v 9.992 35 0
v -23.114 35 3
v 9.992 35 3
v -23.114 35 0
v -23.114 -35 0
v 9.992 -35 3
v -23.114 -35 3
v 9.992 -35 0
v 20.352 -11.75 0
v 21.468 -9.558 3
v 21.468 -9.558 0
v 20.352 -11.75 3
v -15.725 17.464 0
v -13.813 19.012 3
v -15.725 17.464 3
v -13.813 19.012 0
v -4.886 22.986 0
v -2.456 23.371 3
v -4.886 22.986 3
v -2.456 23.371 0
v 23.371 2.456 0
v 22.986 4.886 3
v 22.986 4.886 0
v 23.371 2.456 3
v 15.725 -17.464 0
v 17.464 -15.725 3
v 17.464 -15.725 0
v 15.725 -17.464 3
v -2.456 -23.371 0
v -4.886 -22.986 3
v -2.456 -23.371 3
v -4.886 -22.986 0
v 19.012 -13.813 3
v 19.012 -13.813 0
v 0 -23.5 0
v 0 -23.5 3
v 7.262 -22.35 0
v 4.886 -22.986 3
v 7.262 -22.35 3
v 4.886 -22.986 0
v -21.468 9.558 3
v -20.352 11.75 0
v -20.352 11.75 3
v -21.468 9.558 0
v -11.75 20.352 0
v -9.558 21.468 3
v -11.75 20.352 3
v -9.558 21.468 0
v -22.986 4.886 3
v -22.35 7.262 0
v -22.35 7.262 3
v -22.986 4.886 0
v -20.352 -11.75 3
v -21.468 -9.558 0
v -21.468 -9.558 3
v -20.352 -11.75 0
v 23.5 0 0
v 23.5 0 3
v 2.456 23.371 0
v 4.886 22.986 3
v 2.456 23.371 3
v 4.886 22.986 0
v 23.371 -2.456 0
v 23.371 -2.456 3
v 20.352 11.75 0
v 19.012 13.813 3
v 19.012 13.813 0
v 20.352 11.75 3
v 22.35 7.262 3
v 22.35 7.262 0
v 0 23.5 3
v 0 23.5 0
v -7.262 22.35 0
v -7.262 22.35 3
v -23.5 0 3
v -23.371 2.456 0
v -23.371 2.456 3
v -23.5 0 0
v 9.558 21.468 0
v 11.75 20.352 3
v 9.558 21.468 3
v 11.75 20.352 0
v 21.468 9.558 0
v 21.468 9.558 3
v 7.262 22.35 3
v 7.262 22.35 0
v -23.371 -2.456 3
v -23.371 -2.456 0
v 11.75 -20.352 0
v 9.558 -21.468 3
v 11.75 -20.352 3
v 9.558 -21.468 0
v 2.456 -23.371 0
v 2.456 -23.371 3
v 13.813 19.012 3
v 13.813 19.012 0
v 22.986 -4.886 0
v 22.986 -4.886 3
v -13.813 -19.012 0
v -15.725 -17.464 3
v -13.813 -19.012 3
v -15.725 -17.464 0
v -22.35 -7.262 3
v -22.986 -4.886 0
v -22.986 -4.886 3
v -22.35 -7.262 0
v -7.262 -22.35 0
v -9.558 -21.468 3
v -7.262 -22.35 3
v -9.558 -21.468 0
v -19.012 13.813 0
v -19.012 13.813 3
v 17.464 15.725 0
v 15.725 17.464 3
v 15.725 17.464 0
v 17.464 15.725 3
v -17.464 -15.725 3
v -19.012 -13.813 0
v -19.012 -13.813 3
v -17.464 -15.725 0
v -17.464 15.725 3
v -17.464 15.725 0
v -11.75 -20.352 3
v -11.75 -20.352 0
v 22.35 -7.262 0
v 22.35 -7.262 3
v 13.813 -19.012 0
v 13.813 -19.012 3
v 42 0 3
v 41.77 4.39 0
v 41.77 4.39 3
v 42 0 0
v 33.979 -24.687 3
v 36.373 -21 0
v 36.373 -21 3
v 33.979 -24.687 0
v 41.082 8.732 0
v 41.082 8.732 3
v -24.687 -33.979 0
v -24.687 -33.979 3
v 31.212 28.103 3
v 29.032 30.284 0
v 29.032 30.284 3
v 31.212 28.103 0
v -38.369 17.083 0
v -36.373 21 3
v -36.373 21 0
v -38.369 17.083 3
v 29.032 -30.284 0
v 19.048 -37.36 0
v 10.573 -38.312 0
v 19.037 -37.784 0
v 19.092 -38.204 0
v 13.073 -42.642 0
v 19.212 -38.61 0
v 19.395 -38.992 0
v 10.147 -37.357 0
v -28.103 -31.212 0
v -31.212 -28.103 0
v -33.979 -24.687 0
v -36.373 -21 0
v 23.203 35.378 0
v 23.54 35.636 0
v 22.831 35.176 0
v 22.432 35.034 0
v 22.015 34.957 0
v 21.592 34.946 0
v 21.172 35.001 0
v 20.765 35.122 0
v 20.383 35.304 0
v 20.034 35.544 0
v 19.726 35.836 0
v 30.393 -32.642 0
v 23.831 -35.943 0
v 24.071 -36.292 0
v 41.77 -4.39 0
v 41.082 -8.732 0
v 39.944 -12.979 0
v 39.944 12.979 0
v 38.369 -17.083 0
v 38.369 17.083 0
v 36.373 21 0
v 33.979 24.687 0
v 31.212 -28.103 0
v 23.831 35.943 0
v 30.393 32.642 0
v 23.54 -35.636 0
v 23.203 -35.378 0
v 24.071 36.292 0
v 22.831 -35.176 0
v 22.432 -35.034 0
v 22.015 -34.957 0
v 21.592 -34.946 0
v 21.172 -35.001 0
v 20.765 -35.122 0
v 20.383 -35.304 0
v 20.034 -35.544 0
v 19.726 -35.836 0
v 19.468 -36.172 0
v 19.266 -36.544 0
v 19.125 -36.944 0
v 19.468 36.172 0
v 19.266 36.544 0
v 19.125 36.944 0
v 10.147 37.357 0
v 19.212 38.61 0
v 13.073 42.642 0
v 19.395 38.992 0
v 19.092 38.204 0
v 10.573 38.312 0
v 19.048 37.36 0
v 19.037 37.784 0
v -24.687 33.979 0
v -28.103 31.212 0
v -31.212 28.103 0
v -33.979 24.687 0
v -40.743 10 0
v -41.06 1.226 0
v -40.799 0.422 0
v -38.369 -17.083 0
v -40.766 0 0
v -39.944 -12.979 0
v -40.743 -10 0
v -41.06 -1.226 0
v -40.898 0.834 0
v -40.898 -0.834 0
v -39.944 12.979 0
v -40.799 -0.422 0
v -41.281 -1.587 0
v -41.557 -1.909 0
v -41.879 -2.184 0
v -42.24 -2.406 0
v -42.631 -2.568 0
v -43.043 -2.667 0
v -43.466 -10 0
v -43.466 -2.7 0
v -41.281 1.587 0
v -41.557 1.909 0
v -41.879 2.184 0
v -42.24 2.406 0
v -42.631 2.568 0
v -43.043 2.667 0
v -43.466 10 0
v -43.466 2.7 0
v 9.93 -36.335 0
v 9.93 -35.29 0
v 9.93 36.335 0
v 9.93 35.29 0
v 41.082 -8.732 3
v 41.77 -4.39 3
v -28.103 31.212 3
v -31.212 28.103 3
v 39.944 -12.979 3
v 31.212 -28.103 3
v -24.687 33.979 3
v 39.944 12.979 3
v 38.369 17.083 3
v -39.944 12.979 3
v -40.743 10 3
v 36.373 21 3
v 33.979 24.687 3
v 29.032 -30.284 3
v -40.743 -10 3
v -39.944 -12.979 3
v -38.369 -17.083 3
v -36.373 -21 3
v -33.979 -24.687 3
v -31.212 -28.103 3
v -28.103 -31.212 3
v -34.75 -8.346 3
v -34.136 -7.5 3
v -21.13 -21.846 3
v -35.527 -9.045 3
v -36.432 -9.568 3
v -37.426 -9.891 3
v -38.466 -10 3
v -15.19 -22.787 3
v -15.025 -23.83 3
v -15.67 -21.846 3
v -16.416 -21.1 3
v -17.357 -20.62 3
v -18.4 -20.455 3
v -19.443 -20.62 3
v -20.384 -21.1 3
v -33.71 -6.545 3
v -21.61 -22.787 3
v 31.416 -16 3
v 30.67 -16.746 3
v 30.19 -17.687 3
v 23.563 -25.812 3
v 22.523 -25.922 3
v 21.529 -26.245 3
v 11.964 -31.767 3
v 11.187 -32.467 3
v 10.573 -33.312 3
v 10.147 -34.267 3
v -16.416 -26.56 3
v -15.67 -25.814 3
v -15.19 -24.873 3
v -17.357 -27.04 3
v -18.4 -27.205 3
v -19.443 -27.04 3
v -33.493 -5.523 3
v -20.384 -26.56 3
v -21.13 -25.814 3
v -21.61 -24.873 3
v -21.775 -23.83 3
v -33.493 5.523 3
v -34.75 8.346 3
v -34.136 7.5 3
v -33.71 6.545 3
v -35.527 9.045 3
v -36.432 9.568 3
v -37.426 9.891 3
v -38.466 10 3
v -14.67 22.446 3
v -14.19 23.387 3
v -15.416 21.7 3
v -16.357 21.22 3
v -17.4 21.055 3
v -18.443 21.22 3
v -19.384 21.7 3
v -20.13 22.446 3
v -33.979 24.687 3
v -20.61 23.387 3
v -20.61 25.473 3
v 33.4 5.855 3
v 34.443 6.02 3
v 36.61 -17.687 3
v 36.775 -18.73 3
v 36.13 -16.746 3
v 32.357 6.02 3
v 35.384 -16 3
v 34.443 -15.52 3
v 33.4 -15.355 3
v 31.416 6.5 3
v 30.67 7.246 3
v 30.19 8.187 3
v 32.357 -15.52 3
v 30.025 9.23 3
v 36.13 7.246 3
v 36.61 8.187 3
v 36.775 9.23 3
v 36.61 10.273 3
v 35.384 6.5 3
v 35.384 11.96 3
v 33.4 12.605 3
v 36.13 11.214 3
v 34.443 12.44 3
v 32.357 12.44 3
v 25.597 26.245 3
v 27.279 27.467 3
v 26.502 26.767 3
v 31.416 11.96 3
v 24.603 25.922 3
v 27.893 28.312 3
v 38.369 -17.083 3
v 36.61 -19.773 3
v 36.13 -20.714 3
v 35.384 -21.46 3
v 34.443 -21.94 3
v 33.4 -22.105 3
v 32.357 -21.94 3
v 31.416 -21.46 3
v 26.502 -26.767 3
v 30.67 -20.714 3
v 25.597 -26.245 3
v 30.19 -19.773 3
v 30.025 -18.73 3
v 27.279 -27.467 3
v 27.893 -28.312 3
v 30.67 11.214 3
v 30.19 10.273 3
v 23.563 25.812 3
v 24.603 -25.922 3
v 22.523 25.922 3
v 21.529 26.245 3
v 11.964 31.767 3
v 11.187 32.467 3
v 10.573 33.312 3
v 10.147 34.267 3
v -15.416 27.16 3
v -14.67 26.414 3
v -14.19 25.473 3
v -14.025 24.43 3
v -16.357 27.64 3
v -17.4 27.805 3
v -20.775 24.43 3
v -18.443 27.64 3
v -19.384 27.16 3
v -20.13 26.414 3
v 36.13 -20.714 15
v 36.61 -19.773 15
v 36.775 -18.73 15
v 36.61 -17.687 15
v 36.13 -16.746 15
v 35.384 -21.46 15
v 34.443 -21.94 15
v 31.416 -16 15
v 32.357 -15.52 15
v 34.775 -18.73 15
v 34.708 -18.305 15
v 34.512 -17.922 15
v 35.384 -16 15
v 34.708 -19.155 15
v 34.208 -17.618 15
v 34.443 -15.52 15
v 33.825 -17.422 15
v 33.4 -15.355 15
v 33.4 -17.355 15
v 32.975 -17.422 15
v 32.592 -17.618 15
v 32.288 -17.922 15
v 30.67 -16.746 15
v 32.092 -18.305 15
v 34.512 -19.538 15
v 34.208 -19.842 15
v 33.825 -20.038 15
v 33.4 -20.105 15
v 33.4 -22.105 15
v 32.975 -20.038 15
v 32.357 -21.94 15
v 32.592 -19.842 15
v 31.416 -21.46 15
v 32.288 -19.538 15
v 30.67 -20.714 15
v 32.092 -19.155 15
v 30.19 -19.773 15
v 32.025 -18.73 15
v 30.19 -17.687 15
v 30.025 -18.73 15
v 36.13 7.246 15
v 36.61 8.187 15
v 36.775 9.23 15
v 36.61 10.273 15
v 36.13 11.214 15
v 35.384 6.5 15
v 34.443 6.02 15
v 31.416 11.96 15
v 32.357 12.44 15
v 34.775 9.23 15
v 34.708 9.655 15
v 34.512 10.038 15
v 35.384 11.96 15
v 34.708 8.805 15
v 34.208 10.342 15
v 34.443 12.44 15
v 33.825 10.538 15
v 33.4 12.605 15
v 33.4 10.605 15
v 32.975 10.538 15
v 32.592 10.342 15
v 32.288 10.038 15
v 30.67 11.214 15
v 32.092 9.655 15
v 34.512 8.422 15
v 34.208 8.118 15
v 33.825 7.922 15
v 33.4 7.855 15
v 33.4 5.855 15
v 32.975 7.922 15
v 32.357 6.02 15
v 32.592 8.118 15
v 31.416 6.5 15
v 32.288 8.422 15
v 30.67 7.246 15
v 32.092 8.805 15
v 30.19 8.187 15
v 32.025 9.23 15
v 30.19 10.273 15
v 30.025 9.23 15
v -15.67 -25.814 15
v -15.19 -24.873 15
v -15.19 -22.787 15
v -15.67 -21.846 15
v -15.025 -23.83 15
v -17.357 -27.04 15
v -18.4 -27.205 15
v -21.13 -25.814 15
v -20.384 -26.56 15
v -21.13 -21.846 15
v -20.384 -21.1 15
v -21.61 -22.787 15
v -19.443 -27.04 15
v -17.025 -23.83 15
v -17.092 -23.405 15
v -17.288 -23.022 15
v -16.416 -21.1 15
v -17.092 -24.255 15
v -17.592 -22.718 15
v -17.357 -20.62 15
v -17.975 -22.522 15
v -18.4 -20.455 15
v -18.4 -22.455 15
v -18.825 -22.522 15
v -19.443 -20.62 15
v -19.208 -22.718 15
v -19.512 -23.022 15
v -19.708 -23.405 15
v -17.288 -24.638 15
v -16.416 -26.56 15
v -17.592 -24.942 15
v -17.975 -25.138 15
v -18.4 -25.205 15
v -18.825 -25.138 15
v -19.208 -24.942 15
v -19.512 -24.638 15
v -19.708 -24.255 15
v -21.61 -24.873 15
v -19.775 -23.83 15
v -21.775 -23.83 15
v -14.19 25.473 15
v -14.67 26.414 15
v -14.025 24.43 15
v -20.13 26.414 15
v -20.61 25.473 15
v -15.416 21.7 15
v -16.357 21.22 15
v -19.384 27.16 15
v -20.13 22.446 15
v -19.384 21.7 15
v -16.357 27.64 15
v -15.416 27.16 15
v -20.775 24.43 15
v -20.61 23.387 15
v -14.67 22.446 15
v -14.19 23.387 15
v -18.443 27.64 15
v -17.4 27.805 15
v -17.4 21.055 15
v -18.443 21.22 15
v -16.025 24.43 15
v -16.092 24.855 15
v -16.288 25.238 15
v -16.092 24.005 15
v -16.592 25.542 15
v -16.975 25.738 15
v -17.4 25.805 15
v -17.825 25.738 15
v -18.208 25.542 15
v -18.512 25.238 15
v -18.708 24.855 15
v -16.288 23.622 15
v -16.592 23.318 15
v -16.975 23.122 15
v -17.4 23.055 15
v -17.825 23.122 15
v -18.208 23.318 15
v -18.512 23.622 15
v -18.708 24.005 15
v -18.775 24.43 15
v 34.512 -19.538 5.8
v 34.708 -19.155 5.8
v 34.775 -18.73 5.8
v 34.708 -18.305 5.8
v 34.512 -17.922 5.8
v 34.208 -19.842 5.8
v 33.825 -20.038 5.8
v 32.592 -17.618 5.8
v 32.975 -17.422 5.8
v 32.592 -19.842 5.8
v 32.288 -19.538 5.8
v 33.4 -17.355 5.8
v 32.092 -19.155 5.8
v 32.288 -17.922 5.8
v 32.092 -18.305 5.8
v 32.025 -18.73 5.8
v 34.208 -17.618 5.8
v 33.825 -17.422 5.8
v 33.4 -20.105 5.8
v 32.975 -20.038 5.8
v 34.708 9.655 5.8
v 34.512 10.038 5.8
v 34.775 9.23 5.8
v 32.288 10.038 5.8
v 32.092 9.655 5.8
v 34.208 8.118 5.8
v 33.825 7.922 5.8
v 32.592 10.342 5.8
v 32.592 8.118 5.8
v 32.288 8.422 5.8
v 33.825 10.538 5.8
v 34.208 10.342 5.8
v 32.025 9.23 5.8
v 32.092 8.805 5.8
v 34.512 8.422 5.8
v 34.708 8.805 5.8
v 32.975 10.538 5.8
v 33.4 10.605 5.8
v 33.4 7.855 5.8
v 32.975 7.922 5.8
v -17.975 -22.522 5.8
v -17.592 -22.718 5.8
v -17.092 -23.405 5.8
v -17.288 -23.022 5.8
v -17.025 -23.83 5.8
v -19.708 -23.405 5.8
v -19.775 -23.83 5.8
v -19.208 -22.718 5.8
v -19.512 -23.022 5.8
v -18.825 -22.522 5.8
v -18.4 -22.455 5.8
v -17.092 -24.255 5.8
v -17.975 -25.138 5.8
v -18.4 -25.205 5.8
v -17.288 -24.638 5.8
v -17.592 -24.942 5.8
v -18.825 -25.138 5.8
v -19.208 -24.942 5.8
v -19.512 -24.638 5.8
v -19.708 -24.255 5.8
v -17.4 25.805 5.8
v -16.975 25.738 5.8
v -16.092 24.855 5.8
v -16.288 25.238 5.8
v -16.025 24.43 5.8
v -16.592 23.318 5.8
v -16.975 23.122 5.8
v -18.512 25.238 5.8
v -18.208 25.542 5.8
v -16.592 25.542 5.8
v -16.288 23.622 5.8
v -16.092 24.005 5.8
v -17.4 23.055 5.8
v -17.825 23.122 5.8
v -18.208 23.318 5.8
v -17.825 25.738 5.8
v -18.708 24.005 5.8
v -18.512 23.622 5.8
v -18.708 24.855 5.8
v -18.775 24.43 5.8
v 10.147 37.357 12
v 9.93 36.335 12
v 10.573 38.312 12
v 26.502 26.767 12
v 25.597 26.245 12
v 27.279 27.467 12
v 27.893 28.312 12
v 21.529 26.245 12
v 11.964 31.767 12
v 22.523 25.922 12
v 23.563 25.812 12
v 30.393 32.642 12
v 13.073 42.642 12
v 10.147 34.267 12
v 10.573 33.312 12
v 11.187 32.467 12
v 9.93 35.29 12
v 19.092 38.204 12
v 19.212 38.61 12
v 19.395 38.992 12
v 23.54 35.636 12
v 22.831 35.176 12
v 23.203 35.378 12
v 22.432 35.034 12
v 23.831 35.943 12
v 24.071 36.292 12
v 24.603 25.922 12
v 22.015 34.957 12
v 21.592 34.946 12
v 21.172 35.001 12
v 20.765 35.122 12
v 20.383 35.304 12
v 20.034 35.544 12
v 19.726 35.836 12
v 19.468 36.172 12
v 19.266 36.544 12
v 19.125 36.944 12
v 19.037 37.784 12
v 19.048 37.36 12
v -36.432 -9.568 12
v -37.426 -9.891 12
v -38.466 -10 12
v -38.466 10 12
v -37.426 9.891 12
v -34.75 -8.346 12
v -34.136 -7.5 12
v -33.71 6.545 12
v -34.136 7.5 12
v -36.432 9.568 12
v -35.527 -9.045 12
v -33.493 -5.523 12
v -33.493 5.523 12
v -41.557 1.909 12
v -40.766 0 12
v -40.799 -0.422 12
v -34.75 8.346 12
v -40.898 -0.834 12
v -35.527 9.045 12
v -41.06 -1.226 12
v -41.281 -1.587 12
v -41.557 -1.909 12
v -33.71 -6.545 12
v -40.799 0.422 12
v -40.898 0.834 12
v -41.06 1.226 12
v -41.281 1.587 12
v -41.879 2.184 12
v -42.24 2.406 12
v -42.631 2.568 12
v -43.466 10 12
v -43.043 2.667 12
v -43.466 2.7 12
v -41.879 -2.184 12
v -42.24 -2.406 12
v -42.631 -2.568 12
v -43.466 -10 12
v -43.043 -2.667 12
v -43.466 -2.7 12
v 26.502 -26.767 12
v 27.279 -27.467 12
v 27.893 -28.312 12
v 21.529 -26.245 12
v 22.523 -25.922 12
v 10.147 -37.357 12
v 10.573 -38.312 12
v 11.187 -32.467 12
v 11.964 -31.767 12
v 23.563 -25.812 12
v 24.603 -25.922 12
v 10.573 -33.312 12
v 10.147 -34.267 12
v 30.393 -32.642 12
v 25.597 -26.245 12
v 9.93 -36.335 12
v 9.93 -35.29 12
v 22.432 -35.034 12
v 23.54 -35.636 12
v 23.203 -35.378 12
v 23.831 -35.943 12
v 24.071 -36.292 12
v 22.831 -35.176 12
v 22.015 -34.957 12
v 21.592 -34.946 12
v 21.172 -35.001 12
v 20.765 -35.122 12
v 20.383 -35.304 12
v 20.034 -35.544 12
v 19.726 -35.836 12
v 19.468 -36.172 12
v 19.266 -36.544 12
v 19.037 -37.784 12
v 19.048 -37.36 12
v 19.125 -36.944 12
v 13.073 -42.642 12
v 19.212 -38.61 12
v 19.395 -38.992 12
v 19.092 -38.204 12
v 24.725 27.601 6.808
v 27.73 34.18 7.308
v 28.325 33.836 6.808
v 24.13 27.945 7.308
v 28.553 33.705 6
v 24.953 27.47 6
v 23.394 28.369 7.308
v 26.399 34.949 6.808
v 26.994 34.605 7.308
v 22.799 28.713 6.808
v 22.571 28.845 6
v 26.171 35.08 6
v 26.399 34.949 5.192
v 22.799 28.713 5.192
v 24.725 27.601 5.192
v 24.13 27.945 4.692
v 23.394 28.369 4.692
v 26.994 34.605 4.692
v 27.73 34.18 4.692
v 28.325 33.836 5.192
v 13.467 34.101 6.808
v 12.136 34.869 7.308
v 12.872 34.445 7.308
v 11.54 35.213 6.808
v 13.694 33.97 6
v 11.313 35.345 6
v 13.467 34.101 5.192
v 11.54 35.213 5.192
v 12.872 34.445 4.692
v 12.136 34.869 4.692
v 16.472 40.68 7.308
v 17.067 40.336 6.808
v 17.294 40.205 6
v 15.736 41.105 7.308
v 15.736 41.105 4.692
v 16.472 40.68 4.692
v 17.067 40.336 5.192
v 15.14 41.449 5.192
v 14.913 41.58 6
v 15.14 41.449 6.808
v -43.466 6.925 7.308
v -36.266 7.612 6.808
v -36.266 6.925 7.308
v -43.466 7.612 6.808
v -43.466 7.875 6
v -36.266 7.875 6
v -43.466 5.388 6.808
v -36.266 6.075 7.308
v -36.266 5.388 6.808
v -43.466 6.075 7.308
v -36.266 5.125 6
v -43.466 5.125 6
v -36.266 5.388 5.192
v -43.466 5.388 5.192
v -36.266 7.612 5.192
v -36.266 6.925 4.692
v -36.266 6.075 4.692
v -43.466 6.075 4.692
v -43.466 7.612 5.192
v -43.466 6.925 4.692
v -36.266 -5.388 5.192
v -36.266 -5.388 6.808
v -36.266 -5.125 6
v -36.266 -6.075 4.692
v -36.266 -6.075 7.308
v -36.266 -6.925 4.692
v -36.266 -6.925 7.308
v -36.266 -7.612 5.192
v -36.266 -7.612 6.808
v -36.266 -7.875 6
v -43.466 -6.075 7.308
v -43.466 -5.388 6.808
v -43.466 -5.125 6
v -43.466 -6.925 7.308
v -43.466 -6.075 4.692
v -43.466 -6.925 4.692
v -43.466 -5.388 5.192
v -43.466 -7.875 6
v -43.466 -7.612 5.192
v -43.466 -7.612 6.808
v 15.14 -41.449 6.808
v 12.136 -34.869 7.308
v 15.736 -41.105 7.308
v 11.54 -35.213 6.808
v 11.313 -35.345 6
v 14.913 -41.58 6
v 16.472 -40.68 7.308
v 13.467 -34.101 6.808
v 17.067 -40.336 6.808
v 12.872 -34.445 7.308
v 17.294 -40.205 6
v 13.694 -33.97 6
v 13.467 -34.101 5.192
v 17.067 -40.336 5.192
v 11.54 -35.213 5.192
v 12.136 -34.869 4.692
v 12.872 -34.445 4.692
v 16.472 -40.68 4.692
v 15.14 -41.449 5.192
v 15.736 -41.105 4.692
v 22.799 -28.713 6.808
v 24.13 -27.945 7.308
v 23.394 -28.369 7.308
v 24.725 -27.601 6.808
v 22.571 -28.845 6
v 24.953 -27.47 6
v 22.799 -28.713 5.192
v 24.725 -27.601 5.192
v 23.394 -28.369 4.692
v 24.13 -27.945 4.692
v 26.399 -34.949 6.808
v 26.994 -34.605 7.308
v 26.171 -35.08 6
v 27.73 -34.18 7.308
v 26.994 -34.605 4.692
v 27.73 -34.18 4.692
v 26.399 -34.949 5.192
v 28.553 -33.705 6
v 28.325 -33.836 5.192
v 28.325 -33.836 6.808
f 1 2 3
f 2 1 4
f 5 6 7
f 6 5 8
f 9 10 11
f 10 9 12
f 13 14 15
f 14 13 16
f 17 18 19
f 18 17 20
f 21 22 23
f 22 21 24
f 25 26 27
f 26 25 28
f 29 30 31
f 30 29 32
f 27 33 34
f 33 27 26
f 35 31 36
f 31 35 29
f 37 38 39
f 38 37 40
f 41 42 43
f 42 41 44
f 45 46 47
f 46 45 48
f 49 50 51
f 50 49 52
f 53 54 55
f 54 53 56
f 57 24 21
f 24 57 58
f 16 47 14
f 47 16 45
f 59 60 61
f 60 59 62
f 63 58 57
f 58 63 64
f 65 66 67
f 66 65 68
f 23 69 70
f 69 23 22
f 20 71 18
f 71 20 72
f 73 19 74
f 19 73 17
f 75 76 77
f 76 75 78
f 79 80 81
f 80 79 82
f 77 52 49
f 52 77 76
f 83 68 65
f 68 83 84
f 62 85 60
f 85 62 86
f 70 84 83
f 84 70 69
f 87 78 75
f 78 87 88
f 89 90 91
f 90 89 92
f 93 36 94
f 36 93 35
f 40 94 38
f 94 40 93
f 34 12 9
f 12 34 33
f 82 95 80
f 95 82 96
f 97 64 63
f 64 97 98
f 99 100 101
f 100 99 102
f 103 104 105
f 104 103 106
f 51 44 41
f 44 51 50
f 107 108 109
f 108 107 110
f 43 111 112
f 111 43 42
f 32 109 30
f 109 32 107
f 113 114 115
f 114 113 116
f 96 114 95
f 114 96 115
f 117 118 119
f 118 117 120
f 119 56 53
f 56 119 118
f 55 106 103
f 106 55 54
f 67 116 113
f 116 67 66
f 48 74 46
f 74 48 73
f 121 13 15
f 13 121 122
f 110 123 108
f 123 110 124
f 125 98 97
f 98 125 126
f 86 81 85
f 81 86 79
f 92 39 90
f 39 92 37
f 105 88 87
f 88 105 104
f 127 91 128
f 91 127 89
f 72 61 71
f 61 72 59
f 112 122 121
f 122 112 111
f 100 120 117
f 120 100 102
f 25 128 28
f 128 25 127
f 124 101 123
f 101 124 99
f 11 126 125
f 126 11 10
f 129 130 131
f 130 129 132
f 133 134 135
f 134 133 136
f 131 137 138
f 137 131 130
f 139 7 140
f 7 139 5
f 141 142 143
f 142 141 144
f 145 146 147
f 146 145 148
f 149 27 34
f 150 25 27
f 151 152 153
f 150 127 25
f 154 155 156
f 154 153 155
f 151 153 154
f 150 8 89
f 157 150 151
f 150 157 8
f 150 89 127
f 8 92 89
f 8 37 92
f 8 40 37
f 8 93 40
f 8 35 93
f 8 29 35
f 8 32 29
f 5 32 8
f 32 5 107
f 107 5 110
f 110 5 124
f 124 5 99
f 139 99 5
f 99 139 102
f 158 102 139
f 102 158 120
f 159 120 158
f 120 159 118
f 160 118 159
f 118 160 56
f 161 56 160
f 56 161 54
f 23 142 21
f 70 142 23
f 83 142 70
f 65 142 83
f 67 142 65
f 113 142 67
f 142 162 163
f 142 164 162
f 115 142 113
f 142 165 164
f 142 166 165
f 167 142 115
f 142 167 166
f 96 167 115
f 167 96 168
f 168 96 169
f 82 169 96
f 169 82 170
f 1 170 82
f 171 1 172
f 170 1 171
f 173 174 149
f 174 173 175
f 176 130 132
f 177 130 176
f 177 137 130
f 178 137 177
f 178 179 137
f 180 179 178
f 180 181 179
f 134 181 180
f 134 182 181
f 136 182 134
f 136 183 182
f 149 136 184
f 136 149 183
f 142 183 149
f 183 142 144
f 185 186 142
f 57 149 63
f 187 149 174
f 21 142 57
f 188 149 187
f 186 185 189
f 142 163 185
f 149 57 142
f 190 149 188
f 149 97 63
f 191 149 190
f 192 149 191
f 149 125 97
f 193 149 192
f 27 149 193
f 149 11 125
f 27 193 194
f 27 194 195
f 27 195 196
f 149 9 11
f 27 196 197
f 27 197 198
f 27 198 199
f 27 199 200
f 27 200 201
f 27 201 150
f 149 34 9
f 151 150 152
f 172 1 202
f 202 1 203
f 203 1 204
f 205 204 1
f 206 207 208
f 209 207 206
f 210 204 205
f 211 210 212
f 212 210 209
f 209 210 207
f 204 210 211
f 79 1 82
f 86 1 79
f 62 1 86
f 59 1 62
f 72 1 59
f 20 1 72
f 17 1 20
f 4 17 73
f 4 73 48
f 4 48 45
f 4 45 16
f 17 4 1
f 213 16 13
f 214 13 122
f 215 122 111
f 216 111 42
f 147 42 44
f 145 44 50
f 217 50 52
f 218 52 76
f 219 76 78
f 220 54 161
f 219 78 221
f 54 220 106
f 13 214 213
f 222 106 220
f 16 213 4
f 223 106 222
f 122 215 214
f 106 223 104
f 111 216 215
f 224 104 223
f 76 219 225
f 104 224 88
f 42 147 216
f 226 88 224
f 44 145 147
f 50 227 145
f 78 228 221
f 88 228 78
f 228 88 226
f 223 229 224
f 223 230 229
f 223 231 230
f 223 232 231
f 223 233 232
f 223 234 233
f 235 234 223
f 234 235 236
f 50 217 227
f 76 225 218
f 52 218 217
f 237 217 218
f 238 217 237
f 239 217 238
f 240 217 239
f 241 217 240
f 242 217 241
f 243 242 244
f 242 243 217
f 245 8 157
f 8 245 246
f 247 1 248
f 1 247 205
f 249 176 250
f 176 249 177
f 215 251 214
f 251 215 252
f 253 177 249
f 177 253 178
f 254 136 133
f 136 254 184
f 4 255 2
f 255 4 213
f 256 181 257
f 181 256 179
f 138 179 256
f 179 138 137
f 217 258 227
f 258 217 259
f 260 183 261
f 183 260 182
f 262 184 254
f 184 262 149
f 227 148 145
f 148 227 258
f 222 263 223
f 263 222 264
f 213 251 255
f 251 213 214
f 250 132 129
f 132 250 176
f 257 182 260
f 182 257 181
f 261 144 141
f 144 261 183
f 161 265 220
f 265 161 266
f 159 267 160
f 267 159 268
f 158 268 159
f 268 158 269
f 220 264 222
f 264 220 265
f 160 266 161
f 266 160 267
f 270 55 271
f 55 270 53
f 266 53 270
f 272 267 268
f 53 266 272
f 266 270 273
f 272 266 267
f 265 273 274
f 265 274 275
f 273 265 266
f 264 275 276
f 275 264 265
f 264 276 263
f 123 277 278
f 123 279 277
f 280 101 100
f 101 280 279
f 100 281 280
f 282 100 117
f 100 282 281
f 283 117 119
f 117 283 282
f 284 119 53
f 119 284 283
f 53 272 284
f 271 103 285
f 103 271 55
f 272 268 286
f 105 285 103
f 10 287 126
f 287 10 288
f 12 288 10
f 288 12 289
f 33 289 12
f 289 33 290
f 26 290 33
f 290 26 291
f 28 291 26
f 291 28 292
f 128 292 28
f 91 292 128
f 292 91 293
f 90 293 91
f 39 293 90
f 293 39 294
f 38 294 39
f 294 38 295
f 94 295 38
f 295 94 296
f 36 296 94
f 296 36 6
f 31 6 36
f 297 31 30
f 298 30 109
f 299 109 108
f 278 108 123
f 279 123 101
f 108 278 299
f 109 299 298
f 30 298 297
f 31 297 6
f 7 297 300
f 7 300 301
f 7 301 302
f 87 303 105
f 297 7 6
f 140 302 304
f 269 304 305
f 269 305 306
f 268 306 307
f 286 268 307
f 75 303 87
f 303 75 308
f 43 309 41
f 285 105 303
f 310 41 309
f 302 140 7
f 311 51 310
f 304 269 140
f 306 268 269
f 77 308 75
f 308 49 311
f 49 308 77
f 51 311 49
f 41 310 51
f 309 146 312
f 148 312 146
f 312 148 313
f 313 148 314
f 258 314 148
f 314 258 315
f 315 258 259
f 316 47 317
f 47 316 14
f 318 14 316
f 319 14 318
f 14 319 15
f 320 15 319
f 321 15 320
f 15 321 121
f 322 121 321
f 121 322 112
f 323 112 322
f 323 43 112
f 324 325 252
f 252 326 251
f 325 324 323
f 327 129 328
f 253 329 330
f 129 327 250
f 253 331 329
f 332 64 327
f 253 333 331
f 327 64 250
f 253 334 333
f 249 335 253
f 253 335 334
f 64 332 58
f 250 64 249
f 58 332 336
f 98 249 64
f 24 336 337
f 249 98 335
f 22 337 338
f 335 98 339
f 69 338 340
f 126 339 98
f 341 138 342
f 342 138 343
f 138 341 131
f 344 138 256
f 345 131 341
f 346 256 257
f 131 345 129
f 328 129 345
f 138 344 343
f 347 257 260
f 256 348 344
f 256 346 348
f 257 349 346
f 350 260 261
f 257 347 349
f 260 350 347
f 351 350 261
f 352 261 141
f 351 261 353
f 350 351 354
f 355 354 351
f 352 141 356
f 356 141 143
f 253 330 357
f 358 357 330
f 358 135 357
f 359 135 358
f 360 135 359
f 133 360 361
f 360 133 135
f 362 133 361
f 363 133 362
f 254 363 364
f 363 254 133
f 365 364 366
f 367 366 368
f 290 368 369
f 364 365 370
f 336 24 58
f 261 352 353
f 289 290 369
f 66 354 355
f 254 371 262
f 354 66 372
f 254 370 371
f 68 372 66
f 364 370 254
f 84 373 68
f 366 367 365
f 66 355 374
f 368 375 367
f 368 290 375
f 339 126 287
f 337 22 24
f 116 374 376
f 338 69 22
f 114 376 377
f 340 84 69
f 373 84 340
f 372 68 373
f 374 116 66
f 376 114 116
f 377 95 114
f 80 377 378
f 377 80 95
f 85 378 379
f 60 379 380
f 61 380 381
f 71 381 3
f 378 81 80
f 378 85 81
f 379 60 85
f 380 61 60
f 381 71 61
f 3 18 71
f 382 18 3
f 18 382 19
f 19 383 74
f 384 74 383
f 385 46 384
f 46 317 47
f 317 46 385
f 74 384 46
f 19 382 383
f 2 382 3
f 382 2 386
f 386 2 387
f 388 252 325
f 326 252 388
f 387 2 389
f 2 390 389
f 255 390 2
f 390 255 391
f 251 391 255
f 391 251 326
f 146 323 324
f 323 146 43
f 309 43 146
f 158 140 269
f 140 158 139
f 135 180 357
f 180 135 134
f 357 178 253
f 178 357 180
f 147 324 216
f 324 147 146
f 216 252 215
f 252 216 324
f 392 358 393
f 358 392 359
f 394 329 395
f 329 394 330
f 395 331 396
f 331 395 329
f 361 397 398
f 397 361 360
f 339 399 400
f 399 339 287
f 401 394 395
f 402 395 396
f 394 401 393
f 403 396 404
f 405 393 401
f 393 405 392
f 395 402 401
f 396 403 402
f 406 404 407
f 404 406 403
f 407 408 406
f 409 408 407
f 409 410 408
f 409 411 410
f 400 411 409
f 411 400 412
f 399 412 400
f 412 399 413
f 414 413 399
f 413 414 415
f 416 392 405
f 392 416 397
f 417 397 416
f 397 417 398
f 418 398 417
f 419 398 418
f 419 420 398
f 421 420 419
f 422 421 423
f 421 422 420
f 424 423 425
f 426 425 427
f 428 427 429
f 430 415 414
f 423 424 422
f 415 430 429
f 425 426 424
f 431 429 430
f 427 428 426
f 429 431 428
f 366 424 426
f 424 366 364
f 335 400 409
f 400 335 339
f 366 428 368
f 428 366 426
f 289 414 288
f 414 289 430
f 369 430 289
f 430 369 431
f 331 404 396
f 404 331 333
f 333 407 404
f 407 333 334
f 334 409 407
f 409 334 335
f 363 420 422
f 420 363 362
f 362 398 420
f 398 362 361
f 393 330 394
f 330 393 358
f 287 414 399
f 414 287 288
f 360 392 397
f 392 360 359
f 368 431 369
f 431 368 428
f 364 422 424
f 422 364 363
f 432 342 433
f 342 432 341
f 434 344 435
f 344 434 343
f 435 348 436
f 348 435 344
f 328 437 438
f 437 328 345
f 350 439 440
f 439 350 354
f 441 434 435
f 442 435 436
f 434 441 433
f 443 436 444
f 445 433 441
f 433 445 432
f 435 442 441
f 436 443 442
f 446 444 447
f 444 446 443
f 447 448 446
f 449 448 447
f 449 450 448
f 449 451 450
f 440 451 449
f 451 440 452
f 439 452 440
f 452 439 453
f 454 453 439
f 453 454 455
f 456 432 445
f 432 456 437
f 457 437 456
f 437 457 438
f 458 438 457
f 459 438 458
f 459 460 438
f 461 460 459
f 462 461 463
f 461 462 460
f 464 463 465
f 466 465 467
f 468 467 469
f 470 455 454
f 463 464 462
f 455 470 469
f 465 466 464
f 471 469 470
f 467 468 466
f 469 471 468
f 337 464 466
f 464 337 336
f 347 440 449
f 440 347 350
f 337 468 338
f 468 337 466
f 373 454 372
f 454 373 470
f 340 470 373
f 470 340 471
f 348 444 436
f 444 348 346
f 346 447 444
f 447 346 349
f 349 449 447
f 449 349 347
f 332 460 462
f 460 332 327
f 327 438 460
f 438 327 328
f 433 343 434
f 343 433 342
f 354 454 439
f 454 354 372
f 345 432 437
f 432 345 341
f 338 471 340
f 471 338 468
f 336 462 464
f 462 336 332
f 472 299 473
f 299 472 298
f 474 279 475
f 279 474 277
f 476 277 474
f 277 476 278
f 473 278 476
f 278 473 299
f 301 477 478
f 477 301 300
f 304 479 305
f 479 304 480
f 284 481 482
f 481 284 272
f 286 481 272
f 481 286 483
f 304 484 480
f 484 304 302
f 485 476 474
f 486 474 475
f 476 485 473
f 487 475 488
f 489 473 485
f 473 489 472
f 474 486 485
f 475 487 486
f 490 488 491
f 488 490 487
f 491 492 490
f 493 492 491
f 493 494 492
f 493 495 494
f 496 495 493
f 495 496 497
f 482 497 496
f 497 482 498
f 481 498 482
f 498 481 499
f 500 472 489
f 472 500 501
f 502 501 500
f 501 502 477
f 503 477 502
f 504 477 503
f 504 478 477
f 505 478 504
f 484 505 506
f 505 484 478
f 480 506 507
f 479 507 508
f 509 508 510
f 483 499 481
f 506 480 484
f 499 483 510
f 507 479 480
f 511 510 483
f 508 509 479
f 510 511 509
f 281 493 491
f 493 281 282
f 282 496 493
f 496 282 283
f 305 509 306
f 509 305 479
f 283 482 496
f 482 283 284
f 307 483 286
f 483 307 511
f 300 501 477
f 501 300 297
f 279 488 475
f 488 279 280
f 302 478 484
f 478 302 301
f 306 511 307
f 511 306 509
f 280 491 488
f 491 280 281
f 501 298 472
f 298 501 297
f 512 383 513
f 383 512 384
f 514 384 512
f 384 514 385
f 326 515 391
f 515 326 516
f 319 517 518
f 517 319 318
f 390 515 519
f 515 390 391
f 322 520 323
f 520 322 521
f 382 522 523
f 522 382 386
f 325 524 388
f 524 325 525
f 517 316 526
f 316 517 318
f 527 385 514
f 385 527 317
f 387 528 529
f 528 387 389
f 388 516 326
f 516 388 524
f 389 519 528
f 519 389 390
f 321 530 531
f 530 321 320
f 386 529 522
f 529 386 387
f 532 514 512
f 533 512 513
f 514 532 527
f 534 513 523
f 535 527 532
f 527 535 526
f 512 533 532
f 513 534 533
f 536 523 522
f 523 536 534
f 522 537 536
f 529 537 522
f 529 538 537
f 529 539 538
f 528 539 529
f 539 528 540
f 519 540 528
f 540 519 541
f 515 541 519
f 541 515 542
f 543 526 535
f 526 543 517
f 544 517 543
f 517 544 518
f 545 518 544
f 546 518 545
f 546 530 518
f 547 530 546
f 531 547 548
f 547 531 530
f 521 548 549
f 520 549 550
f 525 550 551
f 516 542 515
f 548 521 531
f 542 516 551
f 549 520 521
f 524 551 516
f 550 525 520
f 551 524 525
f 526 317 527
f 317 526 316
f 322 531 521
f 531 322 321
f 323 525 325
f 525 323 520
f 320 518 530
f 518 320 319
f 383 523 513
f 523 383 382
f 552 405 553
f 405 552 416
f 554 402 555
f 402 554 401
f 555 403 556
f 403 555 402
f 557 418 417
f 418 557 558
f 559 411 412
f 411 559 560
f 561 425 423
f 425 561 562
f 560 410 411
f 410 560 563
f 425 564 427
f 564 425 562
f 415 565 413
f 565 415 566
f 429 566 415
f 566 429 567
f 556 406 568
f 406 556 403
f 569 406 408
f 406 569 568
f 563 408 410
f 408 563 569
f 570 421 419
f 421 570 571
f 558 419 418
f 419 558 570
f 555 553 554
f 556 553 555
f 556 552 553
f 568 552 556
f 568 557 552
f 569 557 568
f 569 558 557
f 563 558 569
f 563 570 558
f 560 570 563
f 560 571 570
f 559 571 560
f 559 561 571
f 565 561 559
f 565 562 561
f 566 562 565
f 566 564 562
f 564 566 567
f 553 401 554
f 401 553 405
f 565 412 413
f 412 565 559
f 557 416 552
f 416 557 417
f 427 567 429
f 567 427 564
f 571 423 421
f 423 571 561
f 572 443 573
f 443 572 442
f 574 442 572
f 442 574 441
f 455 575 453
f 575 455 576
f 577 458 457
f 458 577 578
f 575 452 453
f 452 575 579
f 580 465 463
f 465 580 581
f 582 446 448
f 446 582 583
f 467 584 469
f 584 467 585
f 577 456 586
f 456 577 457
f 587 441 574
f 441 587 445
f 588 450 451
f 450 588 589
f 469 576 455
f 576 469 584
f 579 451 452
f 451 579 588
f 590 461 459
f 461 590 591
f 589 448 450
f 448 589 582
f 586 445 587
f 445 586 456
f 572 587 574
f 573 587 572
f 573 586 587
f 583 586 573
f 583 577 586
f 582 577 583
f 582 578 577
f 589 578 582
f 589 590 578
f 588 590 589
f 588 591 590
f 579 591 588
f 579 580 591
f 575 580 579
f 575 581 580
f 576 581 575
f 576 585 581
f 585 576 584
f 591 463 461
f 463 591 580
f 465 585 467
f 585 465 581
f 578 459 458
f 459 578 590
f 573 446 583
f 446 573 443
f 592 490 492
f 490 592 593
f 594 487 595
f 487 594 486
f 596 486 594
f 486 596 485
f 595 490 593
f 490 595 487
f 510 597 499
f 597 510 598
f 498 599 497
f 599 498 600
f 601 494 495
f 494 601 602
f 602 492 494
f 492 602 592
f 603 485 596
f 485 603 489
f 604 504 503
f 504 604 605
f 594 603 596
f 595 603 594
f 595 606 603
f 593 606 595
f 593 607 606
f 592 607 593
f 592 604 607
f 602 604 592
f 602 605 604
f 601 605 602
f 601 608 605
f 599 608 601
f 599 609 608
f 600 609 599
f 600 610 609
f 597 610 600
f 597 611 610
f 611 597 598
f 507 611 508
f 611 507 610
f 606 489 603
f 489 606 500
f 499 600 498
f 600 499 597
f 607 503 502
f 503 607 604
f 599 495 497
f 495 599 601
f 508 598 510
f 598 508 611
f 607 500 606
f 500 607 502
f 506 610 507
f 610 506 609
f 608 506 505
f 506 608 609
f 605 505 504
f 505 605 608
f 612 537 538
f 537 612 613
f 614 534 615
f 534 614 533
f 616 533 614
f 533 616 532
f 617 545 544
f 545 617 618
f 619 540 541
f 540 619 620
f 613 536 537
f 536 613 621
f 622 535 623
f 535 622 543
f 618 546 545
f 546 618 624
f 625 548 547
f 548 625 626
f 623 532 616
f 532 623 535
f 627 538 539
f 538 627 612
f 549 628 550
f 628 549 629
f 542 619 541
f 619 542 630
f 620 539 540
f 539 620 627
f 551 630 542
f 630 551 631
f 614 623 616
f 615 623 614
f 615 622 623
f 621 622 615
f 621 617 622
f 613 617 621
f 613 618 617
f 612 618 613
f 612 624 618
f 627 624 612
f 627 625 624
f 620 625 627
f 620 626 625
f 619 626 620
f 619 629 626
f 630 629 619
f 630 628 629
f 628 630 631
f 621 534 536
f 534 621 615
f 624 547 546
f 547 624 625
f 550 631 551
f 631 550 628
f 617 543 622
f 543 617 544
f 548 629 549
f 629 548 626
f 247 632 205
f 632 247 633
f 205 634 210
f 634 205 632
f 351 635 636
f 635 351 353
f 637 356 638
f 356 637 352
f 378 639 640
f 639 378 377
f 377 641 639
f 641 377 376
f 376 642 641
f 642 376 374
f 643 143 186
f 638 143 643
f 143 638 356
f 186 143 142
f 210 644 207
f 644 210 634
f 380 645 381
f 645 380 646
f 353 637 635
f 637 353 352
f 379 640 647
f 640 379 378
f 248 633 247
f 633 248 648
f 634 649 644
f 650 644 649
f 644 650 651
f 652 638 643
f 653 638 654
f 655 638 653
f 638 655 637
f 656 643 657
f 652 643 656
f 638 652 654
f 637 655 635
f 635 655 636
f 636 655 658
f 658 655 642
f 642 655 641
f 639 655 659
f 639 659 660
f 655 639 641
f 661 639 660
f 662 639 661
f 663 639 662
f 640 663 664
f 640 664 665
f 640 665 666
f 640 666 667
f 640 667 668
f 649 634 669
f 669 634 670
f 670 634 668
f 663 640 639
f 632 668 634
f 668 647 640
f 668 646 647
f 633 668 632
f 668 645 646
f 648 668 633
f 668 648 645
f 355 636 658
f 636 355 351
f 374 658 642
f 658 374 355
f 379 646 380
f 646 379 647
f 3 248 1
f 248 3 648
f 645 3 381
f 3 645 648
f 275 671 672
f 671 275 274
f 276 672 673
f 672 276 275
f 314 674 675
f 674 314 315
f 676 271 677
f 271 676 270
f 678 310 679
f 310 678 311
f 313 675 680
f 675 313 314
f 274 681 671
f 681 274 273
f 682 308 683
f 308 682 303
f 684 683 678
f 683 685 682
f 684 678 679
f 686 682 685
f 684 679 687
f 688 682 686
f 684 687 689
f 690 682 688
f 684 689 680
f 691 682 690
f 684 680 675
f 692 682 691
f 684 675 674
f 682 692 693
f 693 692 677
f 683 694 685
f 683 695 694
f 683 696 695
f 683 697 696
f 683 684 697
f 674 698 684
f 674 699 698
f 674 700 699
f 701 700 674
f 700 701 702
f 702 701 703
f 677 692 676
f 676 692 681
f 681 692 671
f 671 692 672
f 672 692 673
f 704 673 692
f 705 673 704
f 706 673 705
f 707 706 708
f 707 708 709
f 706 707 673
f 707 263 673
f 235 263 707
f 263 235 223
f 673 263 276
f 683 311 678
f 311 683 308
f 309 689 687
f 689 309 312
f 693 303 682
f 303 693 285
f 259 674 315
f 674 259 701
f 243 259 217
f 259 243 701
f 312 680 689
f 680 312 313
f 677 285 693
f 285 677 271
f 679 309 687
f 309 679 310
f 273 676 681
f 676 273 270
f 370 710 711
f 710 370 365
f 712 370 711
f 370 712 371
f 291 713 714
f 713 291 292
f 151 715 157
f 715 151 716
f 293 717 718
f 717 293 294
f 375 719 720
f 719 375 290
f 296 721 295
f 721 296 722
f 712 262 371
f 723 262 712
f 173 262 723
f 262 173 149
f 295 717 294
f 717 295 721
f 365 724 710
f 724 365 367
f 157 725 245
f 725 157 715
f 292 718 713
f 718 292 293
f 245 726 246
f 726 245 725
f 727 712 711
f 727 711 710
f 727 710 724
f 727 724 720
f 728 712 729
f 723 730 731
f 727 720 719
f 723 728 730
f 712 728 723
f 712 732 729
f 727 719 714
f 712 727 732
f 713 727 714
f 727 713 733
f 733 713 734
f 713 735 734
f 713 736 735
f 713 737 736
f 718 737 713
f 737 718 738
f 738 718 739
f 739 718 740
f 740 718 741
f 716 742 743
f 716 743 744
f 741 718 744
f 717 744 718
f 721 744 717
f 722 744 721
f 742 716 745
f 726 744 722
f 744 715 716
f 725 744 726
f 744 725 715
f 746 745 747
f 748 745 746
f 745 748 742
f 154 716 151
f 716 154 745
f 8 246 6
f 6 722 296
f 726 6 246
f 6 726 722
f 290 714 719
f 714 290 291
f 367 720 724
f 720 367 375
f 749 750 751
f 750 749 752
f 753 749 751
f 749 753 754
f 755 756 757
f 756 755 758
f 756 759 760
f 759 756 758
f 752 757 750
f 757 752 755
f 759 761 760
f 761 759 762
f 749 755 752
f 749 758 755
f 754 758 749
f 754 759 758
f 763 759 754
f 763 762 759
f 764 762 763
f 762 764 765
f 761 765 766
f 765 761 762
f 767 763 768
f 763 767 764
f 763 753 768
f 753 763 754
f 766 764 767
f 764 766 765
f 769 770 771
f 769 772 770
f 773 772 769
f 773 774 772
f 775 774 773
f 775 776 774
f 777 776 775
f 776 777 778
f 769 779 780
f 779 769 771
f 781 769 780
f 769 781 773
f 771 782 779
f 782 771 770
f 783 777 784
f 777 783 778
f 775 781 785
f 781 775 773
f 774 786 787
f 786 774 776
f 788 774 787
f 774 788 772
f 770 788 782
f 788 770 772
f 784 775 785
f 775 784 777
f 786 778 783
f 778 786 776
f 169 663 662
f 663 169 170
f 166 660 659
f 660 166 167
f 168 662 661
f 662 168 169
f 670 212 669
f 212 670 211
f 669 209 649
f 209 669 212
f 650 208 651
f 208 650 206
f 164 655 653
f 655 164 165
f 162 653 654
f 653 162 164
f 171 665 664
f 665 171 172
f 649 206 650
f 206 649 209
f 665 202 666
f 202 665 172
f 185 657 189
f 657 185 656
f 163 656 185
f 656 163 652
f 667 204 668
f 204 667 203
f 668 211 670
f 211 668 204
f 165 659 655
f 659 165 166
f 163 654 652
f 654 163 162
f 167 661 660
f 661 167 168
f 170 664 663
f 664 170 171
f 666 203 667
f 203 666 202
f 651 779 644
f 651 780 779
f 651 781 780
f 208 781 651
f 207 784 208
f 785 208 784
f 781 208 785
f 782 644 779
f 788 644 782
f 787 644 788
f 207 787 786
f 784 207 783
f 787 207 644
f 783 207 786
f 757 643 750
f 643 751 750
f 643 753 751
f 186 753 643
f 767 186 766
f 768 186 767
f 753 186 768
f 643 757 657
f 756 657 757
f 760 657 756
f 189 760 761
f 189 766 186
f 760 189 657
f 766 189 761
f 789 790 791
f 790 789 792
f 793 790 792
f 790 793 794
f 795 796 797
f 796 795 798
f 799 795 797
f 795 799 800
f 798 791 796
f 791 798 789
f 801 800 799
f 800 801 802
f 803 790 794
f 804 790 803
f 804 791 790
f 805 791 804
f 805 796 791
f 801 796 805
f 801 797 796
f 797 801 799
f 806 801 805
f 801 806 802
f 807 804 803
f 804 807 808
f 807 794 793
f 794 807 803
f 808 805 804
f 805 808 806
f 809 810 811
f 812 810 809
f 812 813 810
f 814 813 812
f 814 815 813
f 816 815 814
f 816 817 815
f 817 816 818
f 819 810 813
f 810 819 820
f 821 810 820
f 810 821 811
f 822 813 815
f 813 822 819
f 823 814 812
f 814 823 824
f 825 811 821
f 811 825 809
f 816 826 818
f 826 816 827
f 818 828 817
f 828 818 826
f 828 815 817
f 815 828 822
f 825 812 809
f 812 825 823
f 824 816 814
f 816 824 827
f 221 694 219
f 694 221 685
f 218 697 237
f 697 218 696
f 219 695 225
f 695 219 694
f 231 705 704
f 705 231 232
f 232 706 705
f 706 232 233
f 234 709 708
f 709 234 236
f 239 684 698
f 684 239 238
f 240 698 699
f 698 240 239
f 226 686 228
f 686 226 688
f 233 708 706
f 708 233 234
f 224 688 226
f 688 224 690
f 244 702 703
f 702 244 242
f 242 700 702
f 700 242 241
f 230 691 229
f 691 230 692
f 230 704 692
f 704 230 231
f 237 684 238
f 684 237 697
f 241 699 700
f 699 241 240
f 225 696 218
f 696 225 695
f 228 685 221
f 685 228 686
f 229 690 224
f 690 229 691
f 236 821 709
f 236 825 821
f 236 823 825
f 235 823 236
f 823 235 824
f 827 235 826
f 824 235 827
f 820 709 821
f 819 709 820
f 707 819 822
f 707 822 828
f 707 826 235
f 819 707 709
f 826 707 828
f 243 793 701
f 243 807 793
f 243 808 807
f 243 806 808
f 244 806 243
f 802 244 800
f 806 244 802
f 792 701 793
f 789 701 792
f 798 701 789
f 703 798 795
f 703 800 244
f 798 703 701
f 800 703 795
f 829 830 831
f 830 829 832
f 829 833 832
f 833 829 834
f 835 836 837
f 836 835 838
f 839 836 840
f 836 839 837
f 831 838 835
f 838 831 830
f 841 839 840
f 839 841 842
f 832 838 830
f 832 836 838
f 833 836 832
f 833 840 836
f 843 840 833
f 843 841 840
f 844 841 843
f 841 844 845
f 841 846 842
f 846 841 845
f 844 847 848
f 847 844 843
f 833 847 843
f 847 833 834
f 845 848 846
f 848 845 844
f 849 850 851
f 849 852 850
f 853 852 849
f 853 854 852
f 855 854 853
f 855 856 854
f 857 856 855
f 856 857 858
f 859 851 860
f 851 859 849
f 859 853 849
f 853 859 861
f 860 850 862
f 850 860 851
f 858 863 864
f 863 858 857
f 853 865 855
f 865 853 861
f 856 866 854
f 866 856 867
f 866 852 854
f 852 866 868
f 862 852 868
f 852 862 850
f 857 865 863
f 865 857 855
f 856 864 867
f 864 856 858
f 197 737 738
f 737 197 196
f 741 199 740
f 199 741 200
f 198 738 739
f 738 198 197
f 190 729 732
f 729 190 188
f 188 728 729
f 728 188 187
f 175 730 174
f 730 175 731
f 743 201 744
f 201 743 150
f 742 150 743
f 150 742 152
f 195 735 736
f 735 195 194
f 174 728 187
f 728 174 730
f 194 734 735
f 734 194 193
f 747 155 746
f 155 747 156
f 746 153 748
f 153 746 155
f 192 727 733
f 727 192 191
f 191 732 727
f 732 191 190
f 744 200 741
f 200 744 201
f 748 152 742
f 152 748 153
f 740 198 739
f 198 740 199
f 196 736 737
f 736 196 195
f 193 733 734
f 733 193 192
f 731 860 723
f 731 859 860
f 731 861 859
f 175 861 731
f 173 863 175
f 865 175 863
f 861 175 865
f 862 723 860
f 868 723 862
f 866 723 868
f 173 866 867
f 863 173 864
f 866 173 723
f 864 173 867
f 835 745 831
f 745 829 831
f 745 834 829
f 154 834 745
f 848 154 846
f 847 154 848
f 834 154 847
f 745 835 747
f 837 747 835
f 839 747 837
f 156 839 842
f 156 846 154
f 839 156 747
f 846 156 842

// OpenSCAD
// file: lib/stepper.scad
smWidth = 42;
smLength = 40;
smScrewHoleOffsets = 31/2;
smCenterDiameter = 22;
smExtra = 1;

module stepperMotor() {
    smCenterHeight = 2;
    smShaftDiameter = 5;
    smShaftLength = 23;
    smScrewDepth = 4.5;
    smScrewDiameter = 3;
    smEdgeTrimOffset = 27;
    module add() {
        translate([-smWidth/2, -smLength, -smWidth/2]) {
            cube([smWidth, smLength, smWidth]);
        }
        rotate([-90, 0, 0]) {
            cylinder(d=smCenterDiameter, h=smCenterHeight, $fn=30);
            cylinder(d=smShaftDiameter, h=smShaftLength, $fn=20);
        }
    }
    module del() {
        for (x = [smScrewHoleOffsets, -smScrewHoleOffsets]) {
            for (z = [smScrewHoleOffsets, -smScrewHoleOffsets]) {
                translate([x, iota, z]) {
                    rotate([90, 0, 0]) {
                        cylinder(d=smScrewDiameter, h=smScrewDepth, $fn=40);
                    }
                }
            }
        }
        for (a = [45, 135, 225, 315]) {
            rotate([0, a, 0]) {
                translate([smEdgeTrimOffset,
                        -smLength-iota, -smWidth/2-iota]) {
                    cube([smWidth, smLength+2*iota, smWidth+2*iota]);
                }
            }
        }

    }
    difference() {
        add();
        del();
    }
}

module stepperMotorHole() {
    smHoleHeight = 20;
    smScrewHoleDiameter = 4;

    widthPlusExtra = smWidth + smExtra;
    lengthPlusExtra = smLength + smExtra/2;

    translate([-smWidth/2, -lengthPlusExtra, -widthPlusExtra/2]) {
        cube([smWidth, lengthPlusExtra, widthPlusExtra]);
    }
    translate([0, -iota, 0]) {
        rotate([-90, 0, 0]) {
            cylinder(d=smCenterDiameter+smExtra, h=smHoleHeight, $fn=40);
        }
    }
    for (x = [smScrewHoleOffsets, -smScrewHoleOffsets]) {
        for (z = [smScrewHoleOffsets, -smScrewHoleOffsets]) {
            translate([x, smHoleHeight-iota, z]) {
                rotate([90, 0, 0]) {
                    cylinder(d=smScrewHoleDiameter, h=smHoleHeight, $fn=40);
                }
            }
        }
    }

}
// file: lib/commonConstants.scad
// A small quantity to keep parts from starting or ending at exactly the
// same location. For example when we create a hole through an object we
// want the object being subtracted to stick slightly past the object being
// subtracted from.
iota = 0.1;


// Length and hole diameter of the #4 x 3/8in Phillips mount screw.
screwLength = 9.3;
screwHoleDiameter = 2.75;
screwHeadDiameter = 6.5;
screwBodyDiameter = 3.4;


// These constants are the basic parameters of the mount plate. They are
// necessary for other components to make their calculations.
mountPlateWidth = 37.6;
mountPlateLength = 51;


// These constants are the basis for the carbon fiber mount points. They are
// necessary for other components to make their calculations.
mountRodDiameter = 5.5;         // A little extra because holes are smaller.
mountThickness = 9;
mountDiameter = mountRodDiameter + 2*mountThickness;


// These constasnts are teh basis for the motor base. They are necessary for
// other components to make their calculations.
motorBaseExtraAxisOffset = 5;
motorBaseTopOffset = sqrt(3)*mountPlateWidth/6 + motorBaseExtraAxisOffset;
motorBaseBottomOffset = mountPlateLength/sqrt(2) + motorBaseTopOffset;
motorBaseBottomRadius = sqrt(pow(motorBaseBottomOffset,2) +
                             pow(mountPlateWidth/2, 2));
mountBaseRodOffsets = motorBaseBottomRadius-mountDiameter/2;
// main file
include <lib/commonConstants.scad>;
include <lib/stepper.scad>;
include <lib/commonMounts.scad>;

arduinoMount();
